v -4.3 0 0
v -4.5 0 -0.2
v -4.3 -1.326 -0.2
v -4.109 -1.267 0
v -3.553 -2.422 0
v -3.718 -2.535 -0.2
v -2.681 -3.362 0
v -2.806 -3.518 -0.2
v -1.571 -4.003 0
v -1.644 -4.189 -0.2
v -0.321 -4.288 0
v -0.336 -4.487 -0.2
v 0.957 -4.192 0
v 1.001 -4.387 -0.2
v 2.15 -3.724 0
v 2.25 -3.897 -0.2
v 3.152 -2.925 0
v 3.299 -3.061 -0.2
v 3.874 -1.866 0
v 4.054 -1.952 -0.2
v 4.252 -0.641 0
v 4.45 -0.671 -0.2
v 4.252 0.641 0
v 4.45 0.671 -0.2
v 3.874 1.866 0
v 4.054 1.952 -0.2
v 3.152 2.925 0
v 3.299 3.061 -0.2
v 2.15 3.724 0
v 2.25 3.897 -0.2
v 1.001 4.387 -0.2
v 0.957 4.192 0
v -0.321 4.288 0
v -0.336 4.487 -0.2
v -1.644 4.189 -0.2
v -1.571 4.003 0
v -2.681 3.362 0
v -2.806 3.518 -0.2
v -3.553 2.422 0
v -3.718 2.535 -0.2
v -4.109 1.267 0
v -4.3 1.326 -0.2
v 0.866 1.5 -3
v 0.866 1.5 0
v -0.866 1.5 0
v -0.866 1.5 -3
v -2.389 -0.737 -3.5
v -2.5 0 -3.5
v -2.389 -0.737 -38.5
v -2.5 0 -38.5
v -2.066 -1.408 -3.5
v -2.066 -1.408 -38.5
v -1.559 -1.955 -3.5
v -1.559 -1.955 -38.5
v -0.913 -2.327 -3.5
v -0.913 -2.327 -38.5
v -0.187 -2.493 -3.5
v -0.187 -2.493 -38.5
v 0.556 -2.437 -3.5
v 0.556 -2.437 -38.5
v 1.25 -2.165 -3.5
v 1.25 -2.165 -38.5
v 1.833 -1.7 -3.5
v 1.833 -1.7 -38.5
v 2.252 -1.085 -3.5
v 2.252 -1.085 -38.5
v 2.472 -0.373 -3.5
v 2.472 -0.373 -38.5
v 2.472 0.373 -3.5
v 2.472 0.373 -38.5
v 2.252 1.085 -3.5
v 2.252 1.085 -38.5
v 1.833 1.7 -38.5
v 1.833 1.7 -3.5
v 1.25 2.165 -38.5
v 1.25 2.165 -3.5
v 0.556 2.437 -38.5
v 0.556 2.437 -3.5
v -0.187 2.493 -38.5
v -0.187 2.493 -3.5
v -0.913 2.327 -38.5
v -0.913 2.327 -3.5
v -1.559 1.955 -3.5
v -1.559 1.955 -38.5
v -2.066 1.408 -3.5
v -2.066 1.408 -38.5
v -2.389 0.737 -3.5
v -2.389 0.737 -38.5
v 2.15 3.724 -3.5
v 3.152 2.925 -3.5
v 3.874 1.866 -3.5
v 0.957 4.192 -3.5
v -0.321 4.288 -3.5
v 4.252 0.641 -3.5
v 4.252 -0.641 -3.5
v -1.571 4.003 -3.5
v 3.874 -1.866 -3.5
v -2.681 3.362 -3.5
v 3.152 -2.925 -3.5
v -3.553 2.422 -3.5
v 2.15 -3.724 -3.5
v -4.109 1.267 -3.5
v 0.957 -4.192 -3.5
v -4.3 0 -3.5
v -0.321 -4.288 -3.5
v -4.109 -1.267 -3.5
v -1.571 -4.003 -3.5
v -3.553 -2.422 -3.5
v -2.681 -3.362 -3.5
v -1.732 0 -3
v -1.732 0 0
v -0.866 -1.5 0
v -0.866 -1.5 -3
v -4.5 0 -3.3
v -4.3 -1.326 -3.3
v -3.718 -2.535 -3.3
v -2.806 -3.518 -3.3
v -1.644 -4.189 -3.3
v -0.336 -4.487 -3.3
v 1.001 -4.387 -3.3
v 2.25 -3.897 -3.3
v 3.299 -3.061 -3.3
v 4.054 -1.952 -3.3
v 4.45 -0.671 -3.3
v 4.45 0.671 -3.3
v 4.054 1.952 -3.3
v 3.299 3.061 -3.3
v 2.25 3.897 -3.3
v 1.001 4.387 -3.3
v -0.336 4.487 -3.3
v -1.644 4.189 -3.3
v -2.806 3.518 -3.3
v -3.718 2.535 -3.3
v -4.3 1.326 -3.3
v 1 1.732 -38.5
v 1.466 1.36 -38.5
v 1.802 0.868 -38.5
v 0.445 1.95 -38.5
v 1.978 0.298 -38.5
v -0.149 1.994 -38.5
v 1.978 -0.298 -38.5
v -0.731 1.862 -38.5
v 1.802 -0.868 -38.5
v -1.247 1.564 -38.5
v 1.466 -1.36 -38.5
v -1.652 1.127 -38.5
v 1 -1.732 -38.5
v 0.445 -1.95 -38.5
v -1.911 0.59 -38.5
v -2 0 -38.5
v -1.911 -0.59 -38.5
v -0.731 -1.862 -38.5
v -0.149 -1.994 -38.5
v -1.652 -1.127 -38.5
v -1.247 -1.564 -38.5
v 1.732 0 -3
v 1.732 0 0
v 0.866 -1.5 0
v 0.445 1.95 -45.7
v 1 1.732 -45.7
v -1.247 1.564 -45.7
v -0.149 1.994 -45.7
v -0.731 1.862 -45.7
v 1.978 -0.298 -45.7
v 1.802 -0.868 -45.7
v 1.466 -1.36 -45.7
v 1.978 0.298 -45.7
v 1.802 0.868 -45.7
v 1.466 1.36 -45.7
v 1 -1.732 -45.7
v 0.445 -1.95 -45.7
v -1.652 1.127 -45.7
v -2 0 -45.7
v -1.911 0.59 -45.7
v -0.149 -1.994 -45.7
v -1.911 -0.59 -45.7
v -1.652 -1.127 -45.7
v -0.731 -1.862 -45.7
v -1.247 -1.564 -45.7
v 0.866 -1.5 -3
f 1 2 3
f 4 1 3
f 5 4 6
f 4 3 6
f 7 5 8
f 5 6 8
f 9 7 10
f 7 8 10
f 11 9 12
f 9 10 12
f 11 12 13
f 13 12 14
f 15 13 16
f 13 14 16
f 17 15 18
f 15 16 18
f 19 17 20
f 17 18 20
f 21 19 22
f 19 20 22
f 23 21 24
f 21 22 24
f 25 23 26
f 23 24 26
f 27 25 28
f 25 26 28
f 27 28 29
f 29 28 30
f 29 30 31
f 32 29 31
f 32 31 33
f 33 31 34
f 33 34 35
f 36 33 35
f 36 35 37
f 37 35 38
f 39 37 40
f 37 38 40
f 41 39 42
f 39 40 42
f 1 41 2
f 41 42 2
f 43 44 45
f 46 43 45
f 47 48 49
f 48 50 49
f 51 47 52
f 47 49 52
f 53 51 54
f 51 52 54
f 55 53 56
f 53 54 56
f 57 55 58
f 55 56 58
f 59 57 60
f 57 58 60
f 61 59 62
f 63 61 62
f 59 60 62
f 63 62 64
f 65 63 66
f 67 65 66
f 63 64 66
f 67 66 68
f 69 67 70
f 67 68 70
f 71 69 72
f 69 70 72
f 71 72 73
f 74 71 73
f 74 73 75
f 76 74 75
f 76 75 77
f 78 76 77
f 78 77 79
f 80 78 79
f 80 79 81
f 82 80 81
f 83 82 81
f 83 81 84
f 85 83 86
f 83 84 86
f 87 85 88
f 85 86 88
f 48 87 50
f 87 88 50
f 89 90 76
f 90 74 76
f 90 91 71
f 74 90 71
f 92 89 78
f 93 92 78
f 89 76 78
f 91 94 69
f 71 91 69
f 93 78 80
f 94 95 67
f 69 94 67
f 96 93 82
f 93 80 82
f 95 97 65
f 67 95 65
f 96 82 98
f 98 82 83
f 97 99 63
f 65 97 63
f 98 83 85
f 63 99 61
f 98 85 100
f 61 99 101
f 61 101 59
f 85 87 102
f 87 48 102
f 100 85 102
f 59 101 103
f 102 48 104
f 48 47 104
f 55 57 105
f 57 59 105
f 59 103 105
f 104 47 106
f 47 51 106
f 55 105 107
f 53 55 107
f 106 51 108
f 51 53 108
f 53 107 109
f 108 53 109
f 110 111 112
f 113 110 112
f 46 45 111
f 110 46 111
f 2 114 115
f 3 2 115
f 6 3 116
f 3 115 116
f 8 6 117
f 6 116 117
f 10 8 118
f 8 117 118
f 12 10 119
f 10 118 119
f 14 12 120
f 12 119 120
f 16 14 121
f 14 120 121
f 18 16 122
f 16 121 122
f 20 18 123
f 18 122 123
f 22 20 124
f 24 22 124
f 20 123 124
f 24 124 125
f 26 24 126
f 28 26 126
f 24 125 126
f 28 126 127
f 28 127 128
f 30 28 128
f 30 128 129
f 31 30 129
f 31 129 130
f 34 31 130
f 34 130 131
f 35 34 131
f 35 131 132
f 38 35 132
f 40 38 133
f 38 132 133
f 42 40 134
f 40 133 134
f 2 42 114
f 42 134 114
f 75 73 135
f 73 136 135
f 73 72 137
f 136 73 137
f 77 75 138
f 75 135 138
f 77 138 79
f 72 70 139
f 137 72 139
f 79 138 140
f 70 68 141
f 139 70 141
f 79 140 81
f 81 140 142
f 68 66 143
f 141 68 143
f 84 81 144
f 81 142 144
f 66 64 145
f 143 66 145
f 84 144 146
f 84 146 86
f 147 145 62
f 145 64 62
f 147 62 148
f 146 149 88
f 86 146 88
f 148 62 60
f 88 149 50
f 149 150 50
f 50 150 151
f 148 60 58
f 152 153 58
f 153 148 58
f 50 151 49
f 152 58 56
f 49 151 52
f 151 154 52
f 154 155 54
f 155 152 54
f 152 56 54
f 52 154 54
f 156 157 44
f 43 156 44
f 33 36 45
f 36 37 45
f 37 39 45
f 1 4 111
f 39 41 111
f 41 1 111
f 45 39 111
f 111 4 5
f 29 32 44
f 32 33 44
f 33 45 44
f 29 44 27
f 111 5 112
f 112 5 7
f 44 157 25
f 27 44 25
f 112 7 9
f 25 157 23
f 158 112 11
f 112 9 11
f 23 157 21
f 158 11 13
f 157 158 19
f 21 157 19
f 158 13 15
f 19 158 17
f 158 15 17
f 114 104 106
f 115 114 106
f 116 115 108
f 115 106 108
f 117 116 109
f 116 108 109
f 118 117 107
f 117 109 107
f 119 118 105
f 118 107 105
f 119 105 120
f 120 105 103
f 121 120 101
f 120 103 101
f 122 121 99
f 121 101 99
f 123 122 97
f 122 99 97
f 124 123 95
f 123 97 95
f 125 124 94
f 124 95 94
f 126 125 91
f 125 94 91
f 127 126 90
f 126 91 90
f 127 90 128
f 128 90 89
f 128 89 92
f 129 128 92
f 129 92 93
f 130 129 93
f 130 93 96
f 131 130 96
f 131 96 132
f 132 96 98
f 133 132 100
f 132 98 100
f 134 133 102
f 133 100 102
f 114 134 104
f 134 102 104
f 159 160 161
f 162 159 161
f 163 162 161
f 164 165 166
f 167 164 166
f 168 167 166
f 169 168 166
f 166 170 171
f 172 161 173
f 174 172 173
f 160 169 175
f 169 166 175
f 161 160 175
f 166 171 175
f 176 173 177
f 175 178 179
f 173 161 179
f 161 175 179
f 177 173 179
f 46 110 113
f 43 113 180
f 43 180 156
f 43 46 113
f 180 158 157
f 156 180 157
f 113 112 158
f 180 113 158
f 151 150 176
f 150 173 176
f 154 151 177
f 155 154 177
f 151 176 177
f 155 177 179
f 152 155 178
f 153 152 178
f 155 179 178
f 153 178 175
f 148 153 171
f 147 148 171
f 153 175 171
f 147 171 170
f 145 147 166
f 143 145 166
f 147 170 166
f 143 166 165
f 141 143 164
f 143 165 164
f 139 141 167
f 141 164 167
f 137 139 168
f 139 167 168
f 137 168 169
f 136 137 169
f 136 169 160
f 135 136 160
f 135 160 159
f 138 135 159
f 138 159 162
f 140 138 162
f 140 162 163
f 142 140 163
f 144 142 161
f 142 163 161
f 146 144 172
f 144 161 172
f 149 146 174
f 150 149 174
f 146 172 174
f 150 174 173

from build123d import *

# Parameters (mm, degrees)
CUT_EXTRUDE_1_DEPTH = 3
CHAMFER_1_SIZE      = 0.2


with BuildPart() as part:
    # 草图1 → 旋转1 (revolve)
    with BuildSketch(Plane.YZ, mode=Mode.PRIVATE) as revolve_1_sk:
        Polygon((0, 0), (-4.5, 0), (-4.5, -3.5), (-2.5, -3.5), (-2.5, -38.5), (-2, -38.5), (-2, -45.7), (0, -45.7), align=None)
    revolve(revolve_1_sk.sketch.rotate(Axis((0, 0, -45.7), (0, 0, 1)), 270), axis=Axis((0, 0, -45.7), (0, 0, 1)))

    # 草图2 → 切除-拉伸1 (cut)
    with BuildSketch(Plane.XY):
        Polygon((1.732050808, 0), (0.866025404, 1.5), (-0.866025404, 1.5), (-1.732050808, 0), (-0.866025404, -1.5), (0.866025404, -1.5), align=None)
    extrude(amount=-CUT_EXTRUDE_1_DEPTH, mode=Mode.SUBTRACT)

    # 倒角1
    chamfer_1_edges = [part.edges().sort_by_distance(p)[0] for p in [
        (4.5, 0, -3.5),
        (4.5, 0, 0),
    ]]
    chamfer(chamfer_1_edges, length=CHAMFER_1_SIZE)


solid = part.part
